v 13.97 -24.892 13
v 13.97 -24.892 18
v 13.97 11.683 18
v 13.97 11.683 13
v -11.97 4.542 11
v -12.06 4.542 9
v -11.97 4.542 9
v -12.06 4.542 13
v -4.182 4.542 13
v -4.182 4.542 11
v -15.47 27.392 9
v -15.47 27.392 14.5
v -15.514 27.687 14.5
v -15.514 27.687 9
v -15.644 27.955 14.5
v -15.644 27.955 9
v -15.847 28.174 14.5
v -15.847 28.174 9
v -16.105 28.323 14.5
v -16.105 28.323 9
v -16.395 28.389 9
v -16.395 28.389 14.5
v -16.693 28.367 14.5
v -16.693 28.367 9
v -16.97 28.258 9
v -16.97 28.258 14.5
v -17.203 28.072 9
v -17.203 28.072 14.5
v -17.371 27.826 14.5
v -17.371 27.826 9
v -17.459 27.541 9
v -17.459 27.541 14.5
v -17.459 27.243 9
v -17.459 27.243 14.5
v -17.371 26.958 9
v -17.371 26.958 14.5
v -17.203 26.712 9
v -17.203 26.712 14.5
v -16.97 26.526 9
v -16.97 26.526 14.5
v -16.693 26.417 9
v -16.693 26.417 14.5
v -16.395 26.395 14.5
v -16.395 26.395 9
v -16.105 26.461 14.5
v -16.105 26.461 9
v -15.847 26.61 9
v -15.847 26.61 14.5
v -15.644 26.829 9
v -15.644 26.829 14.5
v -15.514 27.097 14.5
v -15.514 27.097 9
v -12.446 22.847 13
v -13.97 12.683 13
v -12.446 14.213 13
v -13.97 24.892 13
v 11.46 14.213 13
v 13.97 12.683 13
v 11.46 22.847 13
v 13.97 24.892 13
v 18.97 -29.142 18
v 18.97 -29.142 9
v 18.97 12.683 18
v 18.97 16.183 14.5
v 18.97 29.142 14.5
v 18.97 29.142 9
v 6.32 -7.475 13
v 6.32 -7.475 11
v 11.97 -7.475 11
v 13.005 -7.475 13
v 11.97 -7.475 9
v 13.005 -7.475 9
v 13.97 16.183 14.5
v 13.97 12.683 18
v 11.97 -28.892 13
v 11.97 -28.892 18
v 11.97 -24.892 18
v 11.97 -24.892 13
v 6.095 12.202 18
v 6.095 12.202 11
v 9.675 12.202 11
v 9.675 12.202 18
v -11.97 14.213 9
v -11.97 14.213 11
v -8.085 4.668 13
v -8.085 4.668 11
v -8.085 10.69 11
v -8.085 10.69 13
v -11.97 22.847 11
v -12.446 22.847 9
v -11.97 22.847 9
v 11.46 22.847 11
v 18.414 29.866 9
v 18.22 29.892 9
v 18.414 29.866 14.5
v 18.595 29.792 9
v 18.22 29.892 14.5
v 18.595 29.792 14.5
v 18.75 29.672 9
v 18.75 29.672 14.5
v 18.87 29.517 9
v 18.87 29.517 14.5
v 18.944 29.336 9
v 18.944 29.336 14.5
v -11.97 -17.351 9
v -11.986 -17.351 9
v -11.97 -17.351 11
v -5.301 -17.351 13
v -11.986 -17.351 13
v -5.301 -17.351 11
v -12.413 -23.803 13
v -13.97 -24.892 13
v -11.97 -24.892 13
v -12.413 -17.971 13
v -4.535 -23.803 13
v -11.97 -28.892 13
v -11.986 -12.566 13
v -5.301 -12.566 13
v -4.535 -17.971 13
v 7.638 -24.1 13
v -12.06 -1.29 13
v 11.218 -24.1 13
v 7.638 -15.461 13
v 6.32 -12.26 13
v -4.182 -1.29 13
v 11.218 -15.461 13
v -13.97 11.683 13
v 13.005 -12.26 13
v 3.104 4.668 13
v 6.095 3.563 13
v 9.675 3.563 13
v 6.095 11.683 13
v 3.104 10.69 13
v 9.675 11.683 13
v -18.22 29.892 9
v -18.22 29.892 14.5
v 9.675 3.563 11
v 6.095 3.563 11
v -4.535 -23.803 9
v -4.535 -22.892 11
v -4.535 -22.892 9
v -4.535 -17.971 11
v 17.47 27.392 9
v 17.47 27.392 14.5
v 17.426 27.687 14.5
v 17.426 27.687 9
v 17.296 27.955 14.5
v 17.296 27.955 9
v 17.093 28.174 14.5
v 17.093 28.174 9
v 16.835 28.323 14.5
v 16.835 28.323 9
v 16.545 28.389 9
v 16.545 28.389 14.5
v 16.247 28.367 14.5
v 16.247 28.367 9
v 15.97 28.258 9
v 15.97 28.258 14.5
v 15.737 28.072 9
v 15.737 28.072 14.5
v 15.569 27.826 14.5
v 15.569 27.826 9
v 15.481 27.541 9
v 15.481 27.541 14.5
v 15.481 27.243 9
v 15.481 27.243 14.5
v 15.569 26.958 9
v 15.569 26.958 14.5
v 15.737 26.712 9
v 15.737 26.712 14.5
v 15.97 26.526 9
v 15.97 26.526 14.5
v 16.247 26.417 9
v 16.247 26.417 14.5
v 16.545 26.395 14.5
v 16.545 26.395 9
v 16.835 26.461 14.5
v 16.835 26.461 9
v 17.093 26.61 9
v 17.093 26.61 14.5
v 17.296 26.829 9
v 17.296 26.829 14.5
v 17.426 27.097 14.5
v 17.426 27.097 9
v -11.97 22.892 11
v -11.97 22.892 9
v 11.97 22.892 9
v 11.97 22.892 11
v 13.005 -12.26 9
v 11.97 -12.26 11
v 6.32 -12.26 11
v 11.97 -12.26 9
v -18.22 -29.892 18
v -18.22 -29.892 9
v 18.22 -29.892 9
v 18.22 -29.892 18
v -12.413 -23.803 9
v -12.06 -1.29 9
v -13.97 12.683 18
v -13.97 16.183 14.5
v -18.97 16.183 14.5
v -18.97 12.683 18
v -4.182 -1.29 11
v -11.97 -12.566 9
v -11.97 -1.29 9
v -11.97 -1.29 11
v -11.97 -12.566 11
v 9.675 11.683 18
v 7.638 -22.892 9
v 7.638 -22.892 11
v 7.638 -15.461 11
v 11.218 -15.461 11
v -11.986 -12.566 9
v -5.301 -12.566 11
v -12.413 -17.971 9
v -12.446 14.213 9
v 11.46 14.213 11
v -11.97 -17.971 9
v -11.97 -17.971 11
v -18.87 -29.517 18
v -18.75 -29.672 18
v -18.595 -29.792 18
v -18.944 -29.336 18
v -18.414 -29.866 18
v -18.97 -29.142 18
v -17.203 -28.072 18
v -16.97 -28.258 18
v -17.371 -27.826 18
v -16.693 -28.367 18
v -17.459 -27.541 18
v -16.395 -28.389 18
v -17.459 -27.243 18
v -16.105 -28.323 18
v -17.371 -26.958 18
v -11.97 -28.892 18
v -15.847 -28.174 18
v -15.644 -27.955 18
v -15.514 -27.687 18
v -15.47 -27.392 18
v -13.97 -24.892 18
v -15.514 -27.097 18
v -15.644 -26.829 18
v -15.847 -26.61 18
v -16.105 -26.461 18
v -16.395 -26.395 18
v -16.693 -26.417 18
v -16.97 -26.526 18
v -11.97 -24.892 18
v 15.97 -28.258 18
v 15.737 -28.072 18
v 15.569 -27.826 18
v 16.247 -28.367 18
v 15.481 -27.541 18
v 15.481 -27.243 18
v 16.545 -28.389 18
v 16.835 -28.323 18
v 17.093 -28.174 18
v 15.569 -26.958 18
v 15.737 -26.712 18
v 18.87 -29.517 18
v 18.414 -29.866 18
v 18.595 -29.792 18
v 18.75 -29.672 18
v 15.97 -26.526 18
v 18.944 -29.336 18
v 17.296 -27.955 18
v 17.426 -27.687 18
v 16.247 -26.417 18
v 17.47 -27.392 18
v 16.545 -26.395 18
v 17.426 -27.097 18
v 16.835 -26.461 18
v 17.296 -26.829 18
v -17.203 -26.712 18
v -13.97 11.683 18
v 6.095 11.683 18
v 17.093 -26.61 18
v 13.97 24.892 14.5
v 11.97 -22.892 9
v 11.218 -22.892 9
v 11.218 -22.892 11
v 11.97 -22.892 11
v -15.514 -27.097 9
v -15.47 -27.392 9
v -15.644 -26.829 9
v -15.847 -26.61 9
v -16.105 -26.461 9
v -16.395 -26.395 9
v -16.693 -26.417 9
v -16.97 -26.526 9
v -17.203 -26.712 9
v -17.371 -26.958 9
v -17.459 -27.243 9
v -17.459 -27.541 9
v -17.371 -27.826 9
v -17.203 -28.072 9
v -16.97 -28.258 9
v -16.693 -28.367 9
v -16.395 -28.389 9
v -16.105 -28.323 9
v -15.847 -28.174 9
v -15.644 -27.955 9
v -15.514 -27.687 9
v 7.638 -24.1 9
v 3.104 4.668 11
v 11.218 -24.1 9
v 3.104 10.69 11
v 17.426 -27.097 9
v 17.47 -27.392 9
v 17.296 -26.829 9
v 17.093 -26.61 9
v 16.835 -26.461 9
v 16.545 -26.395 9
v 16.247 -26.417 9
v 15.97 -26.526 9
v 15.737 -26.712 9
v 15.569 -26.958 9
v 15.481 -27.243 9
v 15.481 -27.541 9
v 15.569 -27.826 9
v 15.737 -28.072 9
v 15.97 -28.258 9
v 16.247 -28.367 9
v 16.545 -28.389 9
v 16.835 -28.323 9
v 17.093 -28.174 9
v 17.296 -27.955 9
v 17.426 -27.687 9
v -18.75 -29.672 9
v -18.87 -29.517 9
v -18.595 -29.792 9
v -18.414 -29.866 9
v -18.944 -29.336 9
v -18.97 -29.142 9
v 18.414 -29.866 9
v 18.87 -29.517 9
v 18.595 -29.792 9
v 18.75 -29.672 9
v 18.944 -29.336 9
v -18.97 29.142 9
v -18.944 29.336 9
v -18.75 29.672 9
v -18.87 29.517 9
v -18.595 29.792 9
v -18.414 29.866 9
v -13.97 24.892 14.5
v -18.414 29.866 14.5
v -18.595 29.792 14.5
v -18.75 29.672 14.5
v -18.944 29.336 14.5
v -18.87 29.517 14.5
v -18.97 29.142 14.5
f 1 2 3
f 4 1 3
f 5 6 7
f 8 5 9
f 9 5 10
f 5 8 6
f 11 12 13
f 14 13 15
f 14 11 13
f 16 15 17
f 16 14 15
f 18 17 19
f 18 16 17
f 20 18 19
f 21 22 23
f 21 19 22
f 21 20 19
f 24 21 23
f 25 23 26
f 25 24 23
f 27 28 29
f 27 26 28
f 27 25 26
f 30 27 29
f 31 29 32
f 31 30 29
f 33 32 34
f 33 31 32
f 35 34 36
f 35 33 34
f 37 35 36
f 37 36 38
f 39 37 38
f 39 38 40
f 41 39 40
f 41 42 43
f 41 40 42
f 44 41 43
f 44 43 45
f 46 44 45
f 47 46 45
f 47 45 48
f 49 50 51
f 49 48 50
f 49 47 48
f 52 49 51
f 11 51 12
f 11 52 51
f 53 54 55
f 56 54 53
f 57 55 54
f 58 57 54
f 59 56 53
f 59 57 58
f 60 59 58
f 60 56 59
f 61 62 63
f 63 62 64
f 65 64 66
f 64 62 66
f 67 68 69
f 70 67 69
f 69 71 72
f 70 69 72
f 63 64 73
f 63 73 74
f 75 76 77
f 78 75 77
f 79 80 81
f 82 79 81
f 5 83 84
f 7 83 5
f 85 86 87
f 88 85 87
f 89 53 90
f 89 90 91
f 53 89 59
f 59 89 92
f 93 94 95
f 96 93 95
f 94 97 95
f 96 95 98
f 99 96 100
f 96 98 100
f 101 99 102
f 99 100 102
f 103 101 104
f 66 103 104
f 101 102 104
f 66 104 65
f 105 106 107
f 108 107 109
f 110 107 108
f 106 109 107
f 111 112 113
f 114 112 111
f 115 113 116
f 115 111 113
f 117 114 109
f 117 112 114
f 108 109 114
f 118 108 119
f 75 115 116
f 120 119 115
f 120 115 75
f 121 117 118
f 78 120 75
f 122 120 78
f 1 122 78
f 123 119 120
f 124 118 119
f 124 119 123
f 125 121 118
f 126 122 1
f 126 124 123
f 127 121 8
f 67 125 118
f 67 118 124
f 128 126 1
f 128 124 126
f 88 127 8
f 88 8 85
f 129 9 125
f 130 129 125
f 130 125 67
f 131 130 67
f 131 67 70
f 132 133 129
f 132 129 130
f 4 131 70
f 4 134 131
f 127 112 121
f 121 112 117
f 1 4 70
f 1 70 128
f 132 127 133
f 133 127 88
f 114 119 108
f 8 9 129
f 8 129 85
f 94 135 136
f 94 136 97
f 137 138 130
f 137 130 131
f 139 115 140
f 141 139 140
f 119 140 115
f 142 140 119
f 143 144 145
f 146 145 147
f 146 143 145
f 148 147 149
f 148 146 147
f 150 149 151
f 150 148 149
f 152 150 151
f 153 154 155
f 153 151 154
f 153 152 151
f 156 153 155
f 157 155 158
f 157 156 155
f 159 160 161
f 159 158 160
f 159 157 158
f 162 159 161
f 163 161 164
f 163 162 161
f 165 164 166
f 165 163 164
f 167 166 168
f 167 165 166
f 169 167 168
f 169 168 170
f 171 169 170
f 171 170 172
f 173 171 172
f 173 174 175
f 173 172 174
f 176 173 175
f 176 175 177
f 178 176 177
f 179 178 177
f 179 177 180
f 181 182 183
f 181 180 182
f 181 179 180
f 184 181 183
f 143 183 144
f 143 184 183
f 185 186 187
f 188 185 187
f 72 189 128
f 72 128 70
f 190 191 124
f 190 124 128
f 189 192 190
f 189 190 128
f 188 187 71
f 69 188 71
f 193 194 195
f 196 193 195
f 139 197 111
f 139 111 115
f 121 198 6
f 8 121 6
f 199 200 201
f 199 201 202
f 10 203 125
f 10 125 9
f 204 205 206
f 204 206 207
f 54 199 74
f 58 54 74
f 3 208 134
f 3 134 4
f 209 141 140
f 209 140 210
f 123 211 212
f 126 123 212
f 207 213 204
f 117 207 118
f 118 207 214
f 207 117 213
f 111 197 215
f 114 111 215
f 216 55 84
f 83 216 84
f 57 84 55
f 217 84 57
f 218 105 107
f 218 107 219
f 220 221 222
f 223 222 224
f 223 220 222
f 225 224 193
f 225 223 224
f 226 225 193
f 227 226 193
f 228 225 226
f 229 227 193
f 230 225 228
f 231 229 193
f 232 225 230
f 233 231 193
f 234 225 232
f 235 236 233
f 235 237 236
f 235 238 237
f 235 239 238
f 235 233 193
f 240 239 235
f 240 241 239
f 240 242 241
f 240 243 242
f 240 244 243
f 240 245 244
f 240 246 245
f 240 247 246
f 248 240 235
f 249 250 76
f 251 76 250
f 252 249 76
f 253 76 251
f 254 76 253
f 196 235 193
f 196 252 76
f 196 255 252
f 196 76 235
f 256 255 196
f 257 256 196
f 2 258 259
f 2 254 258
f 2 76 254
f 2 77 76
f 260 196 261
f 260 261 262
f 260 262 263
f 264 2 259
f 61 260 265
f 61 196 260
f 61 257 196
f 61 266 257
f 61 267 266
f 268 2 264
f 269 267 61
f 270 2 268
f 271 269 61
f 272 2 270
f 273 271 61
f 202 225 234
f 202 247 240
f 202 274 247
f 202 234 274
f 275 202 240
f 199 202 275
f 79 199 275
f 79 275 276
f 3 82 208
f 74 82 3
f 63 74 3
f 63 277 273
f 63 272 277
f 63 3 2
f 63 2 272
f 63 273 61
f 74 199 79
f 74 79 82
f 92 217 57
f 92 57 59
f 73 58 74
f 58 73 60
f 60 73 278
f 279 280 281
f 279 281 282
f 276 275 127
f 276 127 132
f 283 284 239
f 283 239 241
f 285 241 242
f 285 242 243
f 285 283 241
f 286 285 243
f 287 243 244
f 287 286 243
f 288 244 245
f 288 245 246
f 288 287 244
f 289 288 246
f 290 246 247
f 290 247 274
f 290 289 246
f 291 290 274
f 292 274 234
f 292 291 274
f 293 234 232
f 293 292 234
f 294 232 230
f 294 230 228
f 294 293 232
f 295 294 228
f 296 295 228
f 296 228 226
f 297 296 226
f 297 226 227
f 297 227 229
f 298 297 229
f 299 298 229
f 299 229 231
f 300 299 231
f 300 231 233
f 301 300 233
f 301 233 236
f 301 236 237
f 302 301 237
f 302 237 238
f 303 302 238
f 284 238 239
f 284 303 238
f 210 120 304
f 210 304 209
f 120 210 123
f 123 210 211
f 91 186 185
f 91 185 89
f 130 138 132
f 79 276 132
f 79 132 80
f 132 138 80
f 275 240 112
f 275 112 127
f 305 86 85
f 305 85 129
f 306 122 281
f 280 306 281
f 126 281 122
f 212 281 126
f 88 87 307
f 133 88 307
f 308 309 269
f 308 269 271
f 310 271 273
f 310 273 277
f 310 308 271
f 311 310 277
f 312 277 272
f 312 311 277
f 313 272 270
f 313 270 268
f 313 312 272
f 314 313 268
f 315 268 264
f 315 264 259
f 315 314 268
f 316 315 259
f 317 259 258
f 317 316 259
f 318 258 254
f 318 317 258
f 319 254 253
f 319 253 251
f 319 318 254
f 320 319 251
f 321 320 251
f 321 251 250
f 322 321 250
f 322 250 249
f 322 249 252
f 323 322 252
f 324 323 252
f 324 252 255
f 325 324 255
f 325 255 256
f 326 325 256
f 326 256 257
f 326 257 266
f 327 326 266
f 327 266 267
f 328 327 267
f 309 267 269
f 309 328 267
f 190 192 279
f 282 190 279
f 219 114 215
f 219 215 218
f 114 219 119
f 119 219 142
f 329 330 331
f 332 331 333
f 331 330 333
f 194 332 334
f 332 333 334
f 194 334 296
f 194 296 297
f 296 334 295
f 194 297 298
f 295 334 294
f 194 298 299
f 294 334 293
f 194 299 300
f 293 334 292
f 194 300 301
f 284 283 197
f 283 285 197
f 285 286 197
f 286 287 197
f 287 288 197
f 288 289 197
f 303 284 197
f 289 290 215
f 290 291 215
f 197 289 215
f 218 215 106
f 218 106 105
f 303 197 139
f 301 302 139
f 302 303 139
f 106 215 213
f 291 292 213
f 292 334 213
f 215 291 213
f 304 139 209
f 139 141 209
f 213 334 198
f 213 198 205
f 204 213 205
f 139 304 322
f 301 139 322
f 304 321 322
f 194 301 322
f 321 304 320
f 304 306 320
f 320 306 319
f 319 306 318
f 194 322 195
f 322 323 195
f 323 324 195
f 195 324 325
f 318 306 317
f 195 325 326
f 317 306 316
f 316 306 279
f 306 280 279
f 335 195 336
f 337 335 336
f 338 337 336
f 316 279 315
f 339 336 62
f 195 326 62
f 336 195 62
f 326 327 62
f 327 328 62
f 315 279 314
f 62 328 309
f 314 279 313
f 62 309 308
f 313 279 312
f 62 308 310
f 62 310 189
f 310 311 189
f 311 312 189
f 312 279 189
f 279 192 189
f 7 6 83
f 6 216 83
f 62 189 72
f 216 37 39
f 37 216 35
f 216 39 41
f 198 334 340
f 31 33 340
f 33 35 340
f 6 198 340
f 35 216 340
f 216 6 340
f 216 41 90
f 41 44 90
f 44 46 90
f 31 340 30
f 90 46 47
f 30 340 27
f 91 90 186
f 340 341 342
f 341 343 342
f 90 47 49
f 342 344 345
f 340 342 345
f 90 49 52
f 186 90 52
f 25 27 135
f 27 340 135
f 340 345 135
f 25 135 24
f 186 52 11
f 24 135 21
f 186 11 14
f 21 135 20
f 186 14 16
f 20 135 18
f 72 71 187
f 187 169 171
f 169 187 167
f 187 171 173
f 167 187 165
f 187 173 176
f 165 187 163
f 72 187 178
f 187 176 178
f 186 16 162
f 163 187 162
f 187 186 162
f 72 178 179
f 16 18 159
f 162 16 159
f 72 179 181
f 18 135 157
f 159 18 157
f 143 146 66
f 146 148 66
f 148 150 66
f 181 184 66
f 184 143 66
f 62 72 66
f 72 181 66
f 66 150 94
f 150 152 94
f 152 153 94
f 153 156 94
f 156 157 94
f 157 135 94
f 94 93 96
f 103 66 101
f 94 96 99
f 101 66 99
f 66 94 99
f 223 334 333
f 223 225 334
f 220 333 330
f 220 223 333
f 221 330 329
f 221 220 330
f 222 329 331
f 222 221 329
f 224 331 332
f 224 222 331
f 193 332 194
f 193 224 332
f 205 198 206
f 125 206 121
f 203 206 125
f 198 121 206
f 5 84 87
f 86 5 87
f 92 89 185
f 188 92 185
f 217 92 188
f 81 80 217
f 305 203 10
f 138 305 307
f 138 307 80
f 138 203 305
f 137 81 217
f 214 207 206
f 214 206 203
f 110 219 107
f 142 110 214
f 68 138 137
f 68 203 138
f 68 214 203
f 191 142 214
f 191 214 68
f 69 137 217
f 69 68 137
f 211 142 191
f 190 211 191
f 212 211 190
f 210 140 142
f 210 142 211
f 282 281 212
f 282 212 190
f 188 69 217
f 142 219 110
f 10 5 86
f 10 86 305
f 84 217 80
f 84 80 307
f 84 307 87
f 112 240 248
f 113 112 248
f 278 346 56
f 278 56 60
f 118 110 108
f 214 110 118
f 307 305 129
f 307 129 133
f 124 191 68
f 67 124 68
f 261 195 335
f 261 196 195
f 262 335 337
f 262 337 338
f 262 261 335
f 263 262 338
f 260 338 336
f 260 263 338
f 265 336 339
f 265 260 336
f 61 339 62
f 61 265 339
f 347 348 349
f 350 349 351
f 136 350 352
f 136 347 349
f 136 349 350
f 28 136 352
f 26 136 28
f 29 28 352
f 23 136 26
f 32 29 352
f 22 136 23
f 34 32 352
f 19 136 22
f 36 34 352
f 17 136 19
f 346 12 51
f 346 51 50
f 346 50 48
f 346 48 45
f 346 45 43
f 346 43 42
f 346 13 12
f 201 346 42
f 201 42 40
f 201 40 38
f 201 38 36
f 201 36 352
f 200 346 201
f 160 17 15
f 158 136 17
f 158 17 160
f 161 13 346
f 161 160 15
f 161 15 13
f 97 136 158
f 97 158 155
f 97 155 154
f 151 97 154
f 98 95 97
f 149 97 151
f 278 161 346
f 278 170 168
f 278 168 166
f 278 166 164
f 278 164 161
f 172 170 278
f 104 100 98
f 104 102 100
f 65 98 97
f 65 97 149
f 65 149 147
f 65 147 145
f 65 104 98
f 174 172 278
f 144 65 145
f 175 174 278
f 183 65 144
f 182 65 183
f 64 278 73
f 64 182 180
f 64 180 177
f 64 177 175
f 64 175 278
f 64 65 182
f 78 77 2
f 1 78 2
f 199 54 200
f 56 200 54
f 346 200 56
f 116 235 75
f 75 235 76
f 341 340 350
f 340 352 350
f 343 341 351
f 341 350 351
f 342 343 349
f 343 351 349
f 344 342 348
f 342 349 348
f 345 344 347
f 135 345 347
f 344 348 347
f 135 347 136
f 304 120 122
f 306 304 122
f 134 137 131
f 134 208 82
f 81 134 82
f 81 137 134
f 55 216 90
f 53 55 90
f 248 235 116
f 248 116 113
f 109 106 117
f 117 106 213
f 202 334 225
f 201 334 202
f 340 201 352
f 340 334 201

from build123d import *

# Parameters (mm, degrees)
SKETCH002_W     = 37.94
SKETCH002_H     = 59.784
SKETCH002_R     = 1
SKETCH002_W_2   = 23.906
SKETCH002_H_2   = 8.634
SKETCH002_W_3   = 11.189
SKETCH002_H_3   = 6.022
SKETCH002_W_4   = 3.58
SKETCH002_H_4   = 8.639
SKETCH002_W_5   = 6.685
SKETCH002_H_5   = 4.785
SKETCH002_W_6   = 7.878
SKETCH002_H_6   = 5.832
PAD_DEPTH       = 9
SKETCH_W        = 27.94
SKETCH_H        = 36.575
SKETCH_H_2      = 12.209
POCKET_DEPTH    = 5
POCKET001_DEPTH = 37.94
SKETCH004_W     = 23.94
SKETCH004_H     = 45.784
POCKET002_DEPTH = 2
SKETCH005_W     = 23.94
SKETCH005_H     = 4
POCKET003_DEPTH = 5
FILLET_R        = 0.75


with BuildPart() as part:
    # Sketch002 → Pad (new body)
    with BuildSketch(Plane.XY.offset(9)):
        Rectangle(SKETCH002_W, SKETCH002_H)
        with Locations((-16.47, 27.392)):
            Circle(SKETCH002_R, mode=Mode.SUBTRACT)
        with Locations((16.47, 27.392)):
            Circle(SKETCH002_R, mode=Mode.SUBTRACT)
        with Locations((-16.47, -27.392)):
            Circle(SKETCH002_R, mode=Mode.SUBTRACT)
        with Locations((16.47, -27.392)):
            Circle(SKETCH002_R, mode=Mode.SUBTRACT)
        with Locations((-0.493, 18.53)):
            Rectangle(SKETCH002_W_2, SKETCH002_H_2, mode=Mode.SUBTRACT)
        with Locations((-2.4905, 7.679)):
            Rectangle(SKETCH002_W_3, SKETCH002_H_3, mode=Mode.SUBTRACT)
        with Locations((7.885, 7.8825)):
            Rectangle(SKETCH002_W_4, SKETCH002_H_4, mode=Mode.SUBTRACT)
        with Locations((9.428, -19.7805)):
            Rectangle(SKETCH002_W_4, SKETCH002_H_4, mode=Mode.SUBTRACT)
        with Locations((9.6625, -9.8675)):
            Rectangle(SKETCH002_W_5, SKETCH002_H_5, mode=Mode.SUBTRACT)
        with Locations((-8.6435, -14.9585)):
            Rectangle(SKETCH002_W_5, SKETCH002_H_5, mode=Mode.SUBTRACT)
        with Locations((-8.121, 1.626)):
            Rectangle(SKETCH002_W_6, SKETCH002_H_6, mode=Mode.SUBTRACT)
        with Locations((-8.474, -20.887)):
            Rectangle(SKETCH002_W_6, SKETCH002_H_6, mode=Mode.SUBTRACT)
    extrude(amount=PAD_DEPTH)

    # Sketch (on Face42 of Pad) → Pocket (cut)
    with BuildSketch(Plane.XY.offset(18)):
        with Locations((0, -6.6045)):
            Rectangle(SKETCH_W, SKETCH_H)
        with Locations((0, 18.7875)):
            Rectangle(SKETCH_W, SKETCH_H_2)
    extrude(amount=-POCKET_DEPTH, mode=Mode.SUBTRACT)

    # Sketch003 → Pocket001 (cut)
    with BuildSketch(Plane(origin=(18.97, 0, 9), x_dir=(0, 1, 0), z_dir=(1, 0, 0))):
        Polygon((12.683, 9), (29.892, 9), (29.892, 5.5), (16.183, 5.5), align=None)
    extrude(amount=-POCKET001_DEPTH, mode=Mode.SUBTRACT)

    # Sketch004 → Pocket002 (cut)
    with BuildSketch(Plane(origin=(0, 0, 9), x_dir=(1, 0, 0), z_dir=(0, 0, -1))):
        Rectangle(SKETCH004_W, SKETCH004_H)
    extrude(amount=-POCKET002_DEPTH, mode=Mode.SUBTRACT)

    # Sketch005 (on Face39 of Pocket002) → Pocket003 (cut)
    with BuildSketch(Plane.XY.offset(18)):
        with Locations((0, -26.892)):
            Rectangle(SKETCH005_W, SKETCH005_H)
    extrude(amount=-POCKET003_DEPTH, mode=Mode.SUBTRACT)

    # Fillet
    fillet_edges = [part.edges().sort_by_distance(p)[0] for p in [
        (-18.97, -29.892, 13.5),
        (18.97, -29.892, 13.5),
        (18.97, 29.892, 11.75),
        (-18.97, 29.892, 11.75),
    ]]
    fillet(fillet_edges, radius=FILLET_R)


solid = part.part
